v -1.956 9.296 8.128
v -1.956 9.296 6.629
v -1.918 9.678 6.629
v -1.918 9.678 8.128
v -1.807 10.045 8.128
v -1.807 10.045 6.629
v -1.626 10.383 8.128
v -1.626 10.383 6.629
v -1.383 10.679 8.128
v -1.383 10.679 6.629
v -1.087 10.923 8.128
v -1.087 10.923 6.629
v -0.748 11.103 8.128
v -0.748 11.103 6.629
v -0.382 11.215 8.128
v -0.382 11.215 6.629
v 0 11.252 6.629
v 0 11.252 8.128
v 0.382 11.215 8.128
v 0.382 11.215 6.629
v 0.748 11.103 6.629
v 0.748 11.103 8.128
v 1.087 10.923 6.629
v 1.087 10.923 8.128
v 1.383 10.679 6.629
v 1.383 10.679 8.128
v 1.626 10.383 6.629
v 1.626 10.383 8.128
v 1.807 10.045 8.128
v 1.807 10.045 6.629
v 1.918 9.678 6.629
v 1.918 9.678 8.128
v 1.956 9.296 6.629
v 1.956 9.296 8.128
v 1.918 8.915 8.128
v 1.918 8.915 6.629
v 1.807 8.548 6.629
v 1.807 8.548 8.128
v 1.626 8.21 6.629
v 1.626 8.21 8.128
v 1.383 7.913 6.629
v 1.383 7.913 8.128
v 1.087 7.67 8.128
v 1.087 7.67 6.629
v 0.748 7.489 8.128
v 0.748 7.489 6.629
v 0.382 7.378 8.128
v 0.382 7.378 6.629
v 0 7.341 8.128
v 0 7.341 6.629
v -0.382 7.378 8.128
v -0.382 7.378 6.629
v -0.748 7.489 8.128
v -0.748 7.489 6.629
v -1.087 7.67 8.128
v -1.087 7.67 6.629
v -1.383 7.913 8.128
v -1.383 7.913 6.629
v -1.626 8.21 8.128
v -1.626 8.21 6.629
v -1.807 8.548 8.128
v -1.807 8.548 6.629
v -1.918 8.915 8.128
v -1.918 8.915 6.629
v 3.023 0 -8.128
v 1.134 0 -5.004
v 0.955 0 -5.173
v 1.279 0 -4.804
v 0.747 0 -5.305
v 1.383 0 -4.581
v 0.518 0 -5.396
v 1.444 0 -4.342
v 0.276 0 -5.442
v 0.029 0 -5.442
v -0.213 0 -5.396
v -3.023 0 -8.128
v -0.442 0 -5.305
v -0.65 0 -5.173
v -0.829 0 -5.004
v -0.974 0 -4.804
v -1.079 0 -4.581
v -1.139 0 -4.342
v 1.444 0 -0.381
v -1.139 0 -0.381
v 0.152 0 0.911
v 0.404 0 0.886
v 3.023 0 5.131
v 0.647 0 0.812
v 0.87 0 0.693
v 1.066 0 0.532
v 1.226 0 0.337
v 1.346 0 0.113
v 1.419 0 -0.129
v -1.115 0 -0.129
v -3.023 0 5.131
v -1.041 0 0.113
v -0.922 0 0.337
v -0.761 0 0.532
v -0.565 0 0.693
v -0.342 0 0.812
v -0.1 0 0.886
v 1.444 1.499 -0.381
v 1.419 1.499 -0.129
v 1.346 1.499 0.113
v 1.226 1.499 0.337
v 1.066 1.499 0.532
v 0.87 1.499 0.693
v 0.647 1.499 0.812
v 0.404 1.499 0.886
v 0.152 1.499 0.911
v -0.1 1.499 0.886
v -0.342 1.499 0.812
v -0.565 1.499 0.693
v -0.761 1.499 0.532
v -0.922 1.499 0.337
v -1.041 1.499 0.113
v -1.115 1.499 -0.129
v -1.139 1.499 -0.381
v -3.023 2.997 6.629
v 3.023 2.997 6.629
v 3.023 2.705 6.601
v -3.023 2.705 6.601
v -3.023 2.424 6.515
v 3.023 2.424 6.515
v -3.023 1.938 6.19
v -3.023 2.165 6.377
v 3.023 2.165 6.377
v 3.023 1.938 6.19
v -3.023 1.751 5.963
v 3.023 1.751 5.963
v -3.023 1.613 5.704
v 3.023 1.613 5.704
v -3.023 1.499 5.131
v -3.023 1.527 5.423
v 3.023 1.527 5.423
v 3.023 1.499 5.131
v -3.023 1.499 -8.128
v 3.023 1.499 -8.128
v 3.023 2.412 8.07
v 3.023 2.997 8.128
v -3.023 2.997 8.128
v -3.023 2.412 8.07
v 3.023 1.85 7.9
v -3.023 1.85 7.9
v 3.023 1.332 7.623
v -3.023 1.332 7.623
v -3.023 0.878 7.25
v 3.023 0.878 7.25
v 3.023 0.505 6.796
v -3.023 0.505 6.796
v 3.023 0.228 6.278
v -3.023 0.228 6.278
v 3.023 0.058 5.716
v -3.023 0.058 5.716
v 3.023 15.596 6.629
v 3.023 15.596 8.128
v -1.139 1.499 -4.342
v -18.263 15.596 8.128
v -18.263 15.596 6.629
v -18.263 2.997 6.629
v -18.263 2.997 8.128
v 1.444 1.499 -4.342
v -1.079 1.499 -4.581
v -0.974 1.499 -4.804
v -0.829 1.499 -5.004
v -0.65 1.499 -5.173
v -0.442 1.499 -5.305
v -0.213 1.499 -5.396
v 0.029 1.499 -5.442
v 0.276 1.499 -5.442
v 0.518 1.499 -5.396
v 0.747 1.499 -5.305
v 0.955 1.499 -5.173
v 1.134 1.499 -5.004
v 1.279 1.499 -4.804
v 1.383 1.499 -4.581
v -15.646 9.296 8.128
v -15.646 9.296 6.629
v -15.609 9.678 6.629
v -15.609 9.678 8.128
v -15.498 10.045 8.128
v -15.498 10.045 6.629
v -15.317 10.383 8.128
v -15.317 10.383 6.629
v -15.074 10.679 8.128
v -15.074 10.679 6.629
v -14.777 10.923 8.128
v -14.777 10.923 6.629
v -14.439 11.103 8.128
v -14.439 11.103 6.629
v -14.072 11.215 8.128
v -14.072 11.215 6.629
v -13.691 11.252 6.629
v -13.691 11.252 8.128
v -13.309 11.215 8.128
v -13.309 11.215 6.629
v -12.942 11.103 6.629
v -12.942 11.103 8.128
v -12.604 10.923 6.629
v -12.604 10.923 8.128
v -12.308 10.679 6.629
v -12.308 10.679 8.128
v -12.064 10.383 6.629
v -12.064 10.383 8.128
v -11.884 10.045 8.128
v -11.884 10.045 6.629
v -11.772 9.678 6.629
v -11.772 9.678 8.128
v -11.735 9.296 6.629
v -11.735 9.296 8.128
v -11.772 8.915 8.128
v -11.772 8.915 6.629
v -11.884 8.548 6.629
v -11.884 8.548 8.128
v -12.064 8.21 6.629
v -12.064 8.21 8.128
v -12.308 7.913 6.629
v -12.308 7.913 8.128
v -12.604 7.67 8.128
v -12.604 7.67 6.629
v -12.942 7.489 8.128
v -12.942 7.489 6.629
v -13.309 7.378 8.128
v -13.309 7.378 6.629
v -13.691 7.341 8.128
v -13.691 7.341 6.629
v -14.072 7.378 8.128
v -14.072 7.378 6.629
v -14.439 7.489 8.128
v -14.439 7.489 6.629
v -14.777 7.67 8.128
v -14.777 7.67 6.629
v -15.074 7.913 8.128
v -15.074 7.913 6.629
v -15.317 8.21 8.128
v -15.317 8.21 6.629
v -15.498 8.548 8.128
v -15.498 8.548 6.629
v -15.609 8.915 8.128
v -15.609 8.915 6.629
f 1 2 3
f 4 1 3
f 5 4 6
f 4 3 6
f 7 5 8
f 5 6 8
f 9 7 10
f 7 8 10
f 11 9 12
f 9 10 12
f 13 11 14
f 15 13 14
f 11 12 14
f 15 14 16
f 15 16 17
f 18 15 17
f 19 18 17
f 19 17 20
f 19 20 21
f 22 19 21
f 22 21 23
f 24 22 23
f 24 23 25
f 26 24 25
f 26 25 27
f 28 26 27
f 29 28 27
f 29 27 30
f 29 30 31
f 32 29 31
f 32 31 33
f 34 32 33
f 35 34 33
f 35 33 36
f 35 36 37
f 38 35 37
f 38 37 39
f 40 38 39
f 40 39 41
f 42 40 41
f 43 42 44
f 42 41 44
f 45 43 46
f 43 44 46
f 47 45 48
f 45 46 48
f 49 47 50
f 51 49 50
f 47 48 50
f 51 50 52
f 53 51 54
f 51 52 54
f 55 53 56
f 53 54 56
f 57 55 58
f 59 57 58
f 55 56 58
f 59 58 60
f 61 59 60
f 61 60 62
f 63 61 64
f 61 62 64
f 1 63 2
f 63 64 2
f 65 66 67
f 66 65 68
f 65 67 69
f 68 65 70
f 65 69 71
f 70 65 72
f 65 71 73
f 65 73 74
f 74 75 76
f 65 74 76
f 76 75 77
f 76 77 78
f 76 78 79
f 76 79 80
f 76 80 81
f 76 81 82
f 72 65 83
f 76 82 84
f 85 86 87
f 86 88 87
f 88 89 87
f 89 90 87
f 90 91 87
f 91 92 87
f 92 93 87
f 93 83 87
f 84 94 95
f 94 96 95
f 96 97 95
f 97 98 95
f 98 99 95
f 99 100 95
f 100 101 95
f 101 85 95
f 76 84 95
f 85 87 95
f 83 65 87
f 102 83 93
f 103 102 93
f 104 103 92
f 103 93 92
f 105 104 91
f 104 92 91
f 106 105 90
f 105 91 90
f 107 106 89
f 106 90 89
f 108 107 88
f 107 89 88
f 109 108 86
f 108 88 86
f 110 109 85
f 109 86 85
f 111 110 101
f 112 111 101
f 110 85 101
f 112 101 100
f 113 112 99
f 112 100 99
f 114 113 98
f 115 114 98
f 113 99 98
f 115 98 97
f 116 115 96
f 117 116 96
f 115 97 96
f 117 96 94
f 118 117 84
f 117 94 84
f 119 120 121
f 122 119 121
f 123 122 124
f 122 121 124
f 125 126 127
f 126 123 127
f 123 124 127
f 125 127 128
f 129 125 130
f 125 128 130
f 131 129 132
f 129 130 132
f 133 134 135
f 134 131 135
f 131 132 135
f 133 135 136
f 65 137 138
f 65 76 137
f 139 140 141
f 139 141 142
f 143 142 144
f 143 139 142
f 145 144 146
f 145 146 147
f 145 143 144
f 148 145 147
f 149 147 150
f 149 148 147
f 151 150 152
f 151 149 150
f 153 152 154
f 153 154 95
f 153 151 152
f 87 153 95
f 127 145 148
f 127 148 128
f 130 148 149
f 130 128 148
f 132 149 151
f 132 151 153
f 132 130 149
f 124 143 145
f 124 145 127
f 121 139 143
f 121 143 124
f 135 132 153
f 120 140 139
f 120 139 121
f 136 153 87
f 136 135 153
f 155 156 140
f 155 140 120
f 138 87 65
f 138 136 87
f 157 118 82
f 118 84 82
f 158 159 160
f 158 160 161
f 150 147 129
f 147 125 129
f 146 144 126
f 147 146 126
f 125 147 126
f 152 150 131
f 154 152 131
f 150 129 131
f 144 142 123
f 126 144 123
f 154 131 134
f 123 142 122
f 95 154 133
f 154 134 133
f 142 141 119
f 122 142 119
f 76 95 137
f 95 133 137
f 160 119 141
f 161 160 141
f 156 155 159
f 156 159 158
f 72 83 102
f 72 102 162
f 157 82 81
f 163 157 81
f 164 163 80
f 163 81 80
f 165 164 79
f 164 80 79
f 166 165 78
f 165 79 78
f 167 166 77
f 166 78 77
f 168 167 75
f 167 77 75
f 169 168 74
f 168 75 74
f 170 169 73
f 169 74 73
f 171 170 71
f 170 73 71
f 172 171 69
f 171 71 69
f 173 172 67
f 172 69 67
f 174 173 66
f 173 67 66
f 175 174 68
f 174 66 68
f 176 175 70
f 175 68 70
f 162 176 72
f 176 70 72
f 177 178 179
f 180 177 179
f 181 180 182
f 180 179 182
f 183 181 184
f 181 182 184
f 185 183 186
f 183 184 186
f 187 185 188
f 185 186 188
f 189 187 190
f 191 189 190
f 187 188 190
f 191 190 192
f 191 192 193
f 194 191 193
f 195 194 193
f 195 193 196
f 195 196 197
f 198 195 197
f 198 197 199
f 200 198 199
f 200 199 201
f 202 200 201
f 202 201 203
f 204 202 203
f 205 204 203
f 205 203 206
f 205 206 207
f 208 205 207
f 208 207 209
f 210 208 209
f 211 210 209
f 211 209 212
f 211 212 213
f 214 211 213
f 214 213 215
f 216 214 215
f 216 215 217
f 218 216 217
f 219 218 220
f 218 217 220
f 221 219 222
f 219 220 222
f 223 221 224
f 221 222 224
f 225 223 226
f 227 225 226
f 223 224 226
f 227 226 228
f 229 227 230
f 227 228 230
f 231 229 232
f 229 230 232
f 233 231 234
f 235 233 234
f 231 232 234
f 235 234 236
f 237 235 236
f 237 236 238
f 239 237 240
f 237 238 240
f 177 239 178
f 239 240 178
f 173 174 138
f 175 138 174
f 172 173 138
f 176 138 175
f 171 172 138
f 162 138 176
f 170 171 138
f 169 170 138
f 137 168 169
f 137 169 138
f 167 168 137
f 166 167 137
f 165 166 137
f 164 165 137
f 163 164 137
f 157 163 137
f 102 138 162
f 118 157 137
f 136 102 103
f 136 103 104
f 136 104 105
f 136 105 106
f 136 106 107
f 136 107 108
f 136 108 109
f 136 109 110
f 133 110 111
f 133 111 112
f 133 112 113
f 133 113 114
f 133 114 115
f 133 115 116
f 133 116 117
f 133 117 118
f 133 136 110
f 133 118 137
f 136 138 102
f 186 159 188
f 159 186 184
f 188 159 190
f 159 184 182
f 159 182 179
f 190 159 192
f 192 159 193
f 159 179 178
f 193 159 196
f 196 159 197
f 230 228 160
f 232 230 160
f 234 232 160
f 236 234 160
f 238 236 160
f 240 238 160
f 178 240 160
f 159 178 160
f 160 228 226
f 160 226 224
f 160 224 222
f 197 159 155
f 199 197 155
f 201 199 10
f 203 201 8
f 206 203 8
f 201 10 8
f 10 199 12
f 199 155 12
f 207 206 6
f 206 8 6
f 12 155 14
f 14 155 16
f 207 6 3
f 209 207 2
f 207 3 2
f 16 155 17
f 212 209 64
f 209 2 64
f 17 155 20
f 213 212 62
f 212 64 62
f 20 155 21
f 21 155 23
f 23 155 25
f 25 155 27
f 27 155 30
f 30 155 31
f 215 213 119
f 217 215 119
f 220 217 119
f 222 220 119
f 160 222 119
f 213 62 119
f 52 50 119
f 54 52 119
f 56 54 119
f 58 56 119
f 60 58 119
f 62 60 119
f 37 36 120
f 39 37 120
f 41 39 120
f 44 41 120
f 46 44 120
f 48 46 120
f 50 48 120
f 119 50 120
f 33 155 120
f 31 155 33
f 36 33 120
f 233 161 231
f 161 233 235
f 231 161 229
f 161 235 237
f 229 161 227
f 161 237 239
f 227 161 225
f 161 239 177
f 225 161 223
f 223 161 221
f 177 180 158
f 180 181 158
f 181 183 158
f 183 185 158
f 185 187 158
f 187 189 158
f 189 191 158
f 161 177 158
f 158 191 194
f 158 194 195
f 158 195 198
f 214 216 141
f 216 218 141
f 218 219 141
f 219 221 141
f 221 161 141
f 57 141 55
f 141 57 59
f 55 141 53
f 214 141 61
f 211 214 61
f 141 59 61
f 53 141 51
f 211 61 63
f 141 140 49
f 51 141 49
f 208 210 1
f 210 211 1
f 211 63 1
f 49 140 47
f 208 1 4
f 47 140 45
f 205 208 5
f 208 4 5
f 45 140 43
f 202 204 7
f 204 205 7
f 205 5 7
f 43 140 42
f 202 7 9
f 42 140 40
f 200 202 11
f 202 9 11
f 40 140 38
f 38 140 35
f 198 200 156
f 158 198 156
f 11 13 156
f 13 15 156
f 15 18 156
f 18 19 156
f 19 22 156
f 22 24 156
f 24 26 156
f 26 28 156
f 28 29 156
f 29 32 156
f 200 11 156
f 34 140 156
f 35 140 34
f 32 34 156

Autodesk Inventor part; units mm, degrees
ref_plane "YZ Plane" through (0, 0, 0) normal (1, 0, 0) x (0, 1, 0)
ref_plane "XZ Plane" through (0, 0, 0) normal (0, 1, 0) x (-1, 0, 0)
ref_plane "XY Plane" through (0, 0, 0) normal (0, 0, 1) x (1, 0, 0)
sketch "Sketch1" plane through (0, 0, 0) normal (0, 1, 0) x (-1, 0, 0)
  line L0 (-3.0226, 8.128) -> (3.0226, 8.128)
  line L1 (3.0226, 8.128) -> (3.0226, -8.128)
  line L2 (3.0226, -8.128) -> (-3.0226, -8.128)
  line L3 (-3.0226, -8.128) -> (-3.0226, 8.128)
  line L4 (-3.0226, 8.128) -> (3.0226, -8.128) construction
  line L5 (3.0226, 8.128) -> (-3.0226, -8.128) construction
  line L6 (1.1394, -0.381) -> (1.1394, -4.3425)
  line L7 (-1.4442, -0.381) -> (-1.4442, -4.3425)
  arc A0 (-1.4442, -4.3425) -> (1.1394, -4.3425) centre (-0.1524, -4.1402) ccw
  arc A1 (1.1394, -0.381) -> (-1.4442, -0.381) centre (-0.1524, -0.381) ccw
  line L8 (0, 9.1418) -> (0, -10.0518)
  point P0 (0, 0)
  dimension "d0" = 16.256
  dimension "d1" = 6.0452
  dimension "d2" = 3.9878
  dimension "d3" = 7.747
  dimension "d4" = 3.175
  dimension "d5" = 3.175
extrude "Plate1" add sketch "Sketch1" along normal blind 1.4986 contours L0 L8 A1 L7 A0 L2 L3 | L0 L1 L2 L8 A0 L6 A1
sketch "Sketch2" plane through (3.0226, 0, 6.6294) normal (0, 0, 1) x (1, 0, 0)
  line L0 (-6.0452, 0) -> (0, 0)
  line L1 (0, 0) -> (0, 15.5956)
  line L2 (0, 15.5956) -> (-6.0452, 15.5956)
  line L3 (-6.0452, 15.5956) -> (-6.0452, 0)
edge flange "Flange1" height 15.5956 angle 90 thickness 1.4986 bend radius 1.4986 thickness toward (0, 0, 1) relief straight relief width 1.4986 relief depth 0.7493 edges at (0, 1.4986, 8.128) wall of the first edge with corners at (-3.0226, 0, 6.6294) (3.0226, 0, 6.6294) (3.0226, 15.5956, 6.6294) (-3.0226, 15.5956, 6.6294)
bend "Bend1"
corner "Corner1"
sketch "Sketch4" plane through (3.0226, 15.5956, 6.6294) normal (0, 0, -1) x (-1, 0, 0)
  circle A0 centre (3.0226, -6.2992) radius 1.9558
  line L0 (6.0452, 0) -> (0, 0) projected
  point P0 (3.0226, -15.5956)
  dimension "d21" = 6.2992
  dimension "d22" = 3.9116
extrude "Extrusion3" cut sketch "Sketch4" against normal blind 1.4986
sketch "Sketch5" plane through (-3.0226, 15.5956, 6.6294) normal (-1, 0, 0) x (0, 0, 1)
  line L0 (1.4986, -12.5984) -> (1.4986, 0) projected
  line L1 (0, 0) -> (1.4986, 0) projected
  line L2 (0, 0) -> (0, -12.5984) projected
  line L3 (0, -12.5984) -> (1.4986, -12.5984) projected
  line L4 (0, 0) -> (1.4986, 0)
  line L5 (1.4986, 0) -> (1.4986, -12.5984)
  line L6 (1.4986, -12.5984) -> (0, -12.5984)
  line L7 (0, -12.5984) -> (0, 0)
  point P0 (-6.6294, -15.5956)
extrude "Extrusion4" add sketch "Sketch5" along normal blind 15.24
sketch "Sketch6" plane through (3.0226, 2.9972, 6.6294) normal (0, 0, -1) x (-1, 0, 0)
  circle A0 centre (16.7132, 6.2992) radius 1.9558
  line L0 (21.2852, 12.5984) -> (21.2852, 0) projected
  line L1 (21.2852, 12.5984) -> (0, 12.5984) projected
  point P0 (3.0226, -2.9972)
  dimension "d27" = 4.572
  dimension "d28" = 6.2992
  dimension "d29" = 3.9116
extrude "Extrusion5" cut sketch "Sketch6" against normal up to surface (1.4986 mm away)
equation "\"d11\" = BendReliefWidth"
equation "\"d12\" = BendReliefDepth"
equation "\"d13\" = MinimumRemnant"
equation "\"d14\" = BendRadius"
equation "\"d17\" = BendRadius"
equation "\"d18\" = CornerReliefSize"
equation "\"d19\" = GapSize"
equation "\"d20\" = JacobiRadiusSize"
equation "\"BendRadius\" = Thickness"
equation "\"BendReliefWidth\" = Thickness"
equation "\"BendReliefDepth\" = 0.5 * Thickness"
equation "\"CornerReliefSize\" = 4 * Thickness"
equation "\"MinimumRemnant\" = 2 * Thickness"
equation "\"TransitionRadius\" = BendRadius"
equation "\"JacobiRadiusSize\" = Thickness"
equation "\"GapSize\" = Thickness"
equation "\"d10\" = BendRadius"
equation "\"Thickness\" = 1.4986"
properties part number "dsub37Bracket_right"
